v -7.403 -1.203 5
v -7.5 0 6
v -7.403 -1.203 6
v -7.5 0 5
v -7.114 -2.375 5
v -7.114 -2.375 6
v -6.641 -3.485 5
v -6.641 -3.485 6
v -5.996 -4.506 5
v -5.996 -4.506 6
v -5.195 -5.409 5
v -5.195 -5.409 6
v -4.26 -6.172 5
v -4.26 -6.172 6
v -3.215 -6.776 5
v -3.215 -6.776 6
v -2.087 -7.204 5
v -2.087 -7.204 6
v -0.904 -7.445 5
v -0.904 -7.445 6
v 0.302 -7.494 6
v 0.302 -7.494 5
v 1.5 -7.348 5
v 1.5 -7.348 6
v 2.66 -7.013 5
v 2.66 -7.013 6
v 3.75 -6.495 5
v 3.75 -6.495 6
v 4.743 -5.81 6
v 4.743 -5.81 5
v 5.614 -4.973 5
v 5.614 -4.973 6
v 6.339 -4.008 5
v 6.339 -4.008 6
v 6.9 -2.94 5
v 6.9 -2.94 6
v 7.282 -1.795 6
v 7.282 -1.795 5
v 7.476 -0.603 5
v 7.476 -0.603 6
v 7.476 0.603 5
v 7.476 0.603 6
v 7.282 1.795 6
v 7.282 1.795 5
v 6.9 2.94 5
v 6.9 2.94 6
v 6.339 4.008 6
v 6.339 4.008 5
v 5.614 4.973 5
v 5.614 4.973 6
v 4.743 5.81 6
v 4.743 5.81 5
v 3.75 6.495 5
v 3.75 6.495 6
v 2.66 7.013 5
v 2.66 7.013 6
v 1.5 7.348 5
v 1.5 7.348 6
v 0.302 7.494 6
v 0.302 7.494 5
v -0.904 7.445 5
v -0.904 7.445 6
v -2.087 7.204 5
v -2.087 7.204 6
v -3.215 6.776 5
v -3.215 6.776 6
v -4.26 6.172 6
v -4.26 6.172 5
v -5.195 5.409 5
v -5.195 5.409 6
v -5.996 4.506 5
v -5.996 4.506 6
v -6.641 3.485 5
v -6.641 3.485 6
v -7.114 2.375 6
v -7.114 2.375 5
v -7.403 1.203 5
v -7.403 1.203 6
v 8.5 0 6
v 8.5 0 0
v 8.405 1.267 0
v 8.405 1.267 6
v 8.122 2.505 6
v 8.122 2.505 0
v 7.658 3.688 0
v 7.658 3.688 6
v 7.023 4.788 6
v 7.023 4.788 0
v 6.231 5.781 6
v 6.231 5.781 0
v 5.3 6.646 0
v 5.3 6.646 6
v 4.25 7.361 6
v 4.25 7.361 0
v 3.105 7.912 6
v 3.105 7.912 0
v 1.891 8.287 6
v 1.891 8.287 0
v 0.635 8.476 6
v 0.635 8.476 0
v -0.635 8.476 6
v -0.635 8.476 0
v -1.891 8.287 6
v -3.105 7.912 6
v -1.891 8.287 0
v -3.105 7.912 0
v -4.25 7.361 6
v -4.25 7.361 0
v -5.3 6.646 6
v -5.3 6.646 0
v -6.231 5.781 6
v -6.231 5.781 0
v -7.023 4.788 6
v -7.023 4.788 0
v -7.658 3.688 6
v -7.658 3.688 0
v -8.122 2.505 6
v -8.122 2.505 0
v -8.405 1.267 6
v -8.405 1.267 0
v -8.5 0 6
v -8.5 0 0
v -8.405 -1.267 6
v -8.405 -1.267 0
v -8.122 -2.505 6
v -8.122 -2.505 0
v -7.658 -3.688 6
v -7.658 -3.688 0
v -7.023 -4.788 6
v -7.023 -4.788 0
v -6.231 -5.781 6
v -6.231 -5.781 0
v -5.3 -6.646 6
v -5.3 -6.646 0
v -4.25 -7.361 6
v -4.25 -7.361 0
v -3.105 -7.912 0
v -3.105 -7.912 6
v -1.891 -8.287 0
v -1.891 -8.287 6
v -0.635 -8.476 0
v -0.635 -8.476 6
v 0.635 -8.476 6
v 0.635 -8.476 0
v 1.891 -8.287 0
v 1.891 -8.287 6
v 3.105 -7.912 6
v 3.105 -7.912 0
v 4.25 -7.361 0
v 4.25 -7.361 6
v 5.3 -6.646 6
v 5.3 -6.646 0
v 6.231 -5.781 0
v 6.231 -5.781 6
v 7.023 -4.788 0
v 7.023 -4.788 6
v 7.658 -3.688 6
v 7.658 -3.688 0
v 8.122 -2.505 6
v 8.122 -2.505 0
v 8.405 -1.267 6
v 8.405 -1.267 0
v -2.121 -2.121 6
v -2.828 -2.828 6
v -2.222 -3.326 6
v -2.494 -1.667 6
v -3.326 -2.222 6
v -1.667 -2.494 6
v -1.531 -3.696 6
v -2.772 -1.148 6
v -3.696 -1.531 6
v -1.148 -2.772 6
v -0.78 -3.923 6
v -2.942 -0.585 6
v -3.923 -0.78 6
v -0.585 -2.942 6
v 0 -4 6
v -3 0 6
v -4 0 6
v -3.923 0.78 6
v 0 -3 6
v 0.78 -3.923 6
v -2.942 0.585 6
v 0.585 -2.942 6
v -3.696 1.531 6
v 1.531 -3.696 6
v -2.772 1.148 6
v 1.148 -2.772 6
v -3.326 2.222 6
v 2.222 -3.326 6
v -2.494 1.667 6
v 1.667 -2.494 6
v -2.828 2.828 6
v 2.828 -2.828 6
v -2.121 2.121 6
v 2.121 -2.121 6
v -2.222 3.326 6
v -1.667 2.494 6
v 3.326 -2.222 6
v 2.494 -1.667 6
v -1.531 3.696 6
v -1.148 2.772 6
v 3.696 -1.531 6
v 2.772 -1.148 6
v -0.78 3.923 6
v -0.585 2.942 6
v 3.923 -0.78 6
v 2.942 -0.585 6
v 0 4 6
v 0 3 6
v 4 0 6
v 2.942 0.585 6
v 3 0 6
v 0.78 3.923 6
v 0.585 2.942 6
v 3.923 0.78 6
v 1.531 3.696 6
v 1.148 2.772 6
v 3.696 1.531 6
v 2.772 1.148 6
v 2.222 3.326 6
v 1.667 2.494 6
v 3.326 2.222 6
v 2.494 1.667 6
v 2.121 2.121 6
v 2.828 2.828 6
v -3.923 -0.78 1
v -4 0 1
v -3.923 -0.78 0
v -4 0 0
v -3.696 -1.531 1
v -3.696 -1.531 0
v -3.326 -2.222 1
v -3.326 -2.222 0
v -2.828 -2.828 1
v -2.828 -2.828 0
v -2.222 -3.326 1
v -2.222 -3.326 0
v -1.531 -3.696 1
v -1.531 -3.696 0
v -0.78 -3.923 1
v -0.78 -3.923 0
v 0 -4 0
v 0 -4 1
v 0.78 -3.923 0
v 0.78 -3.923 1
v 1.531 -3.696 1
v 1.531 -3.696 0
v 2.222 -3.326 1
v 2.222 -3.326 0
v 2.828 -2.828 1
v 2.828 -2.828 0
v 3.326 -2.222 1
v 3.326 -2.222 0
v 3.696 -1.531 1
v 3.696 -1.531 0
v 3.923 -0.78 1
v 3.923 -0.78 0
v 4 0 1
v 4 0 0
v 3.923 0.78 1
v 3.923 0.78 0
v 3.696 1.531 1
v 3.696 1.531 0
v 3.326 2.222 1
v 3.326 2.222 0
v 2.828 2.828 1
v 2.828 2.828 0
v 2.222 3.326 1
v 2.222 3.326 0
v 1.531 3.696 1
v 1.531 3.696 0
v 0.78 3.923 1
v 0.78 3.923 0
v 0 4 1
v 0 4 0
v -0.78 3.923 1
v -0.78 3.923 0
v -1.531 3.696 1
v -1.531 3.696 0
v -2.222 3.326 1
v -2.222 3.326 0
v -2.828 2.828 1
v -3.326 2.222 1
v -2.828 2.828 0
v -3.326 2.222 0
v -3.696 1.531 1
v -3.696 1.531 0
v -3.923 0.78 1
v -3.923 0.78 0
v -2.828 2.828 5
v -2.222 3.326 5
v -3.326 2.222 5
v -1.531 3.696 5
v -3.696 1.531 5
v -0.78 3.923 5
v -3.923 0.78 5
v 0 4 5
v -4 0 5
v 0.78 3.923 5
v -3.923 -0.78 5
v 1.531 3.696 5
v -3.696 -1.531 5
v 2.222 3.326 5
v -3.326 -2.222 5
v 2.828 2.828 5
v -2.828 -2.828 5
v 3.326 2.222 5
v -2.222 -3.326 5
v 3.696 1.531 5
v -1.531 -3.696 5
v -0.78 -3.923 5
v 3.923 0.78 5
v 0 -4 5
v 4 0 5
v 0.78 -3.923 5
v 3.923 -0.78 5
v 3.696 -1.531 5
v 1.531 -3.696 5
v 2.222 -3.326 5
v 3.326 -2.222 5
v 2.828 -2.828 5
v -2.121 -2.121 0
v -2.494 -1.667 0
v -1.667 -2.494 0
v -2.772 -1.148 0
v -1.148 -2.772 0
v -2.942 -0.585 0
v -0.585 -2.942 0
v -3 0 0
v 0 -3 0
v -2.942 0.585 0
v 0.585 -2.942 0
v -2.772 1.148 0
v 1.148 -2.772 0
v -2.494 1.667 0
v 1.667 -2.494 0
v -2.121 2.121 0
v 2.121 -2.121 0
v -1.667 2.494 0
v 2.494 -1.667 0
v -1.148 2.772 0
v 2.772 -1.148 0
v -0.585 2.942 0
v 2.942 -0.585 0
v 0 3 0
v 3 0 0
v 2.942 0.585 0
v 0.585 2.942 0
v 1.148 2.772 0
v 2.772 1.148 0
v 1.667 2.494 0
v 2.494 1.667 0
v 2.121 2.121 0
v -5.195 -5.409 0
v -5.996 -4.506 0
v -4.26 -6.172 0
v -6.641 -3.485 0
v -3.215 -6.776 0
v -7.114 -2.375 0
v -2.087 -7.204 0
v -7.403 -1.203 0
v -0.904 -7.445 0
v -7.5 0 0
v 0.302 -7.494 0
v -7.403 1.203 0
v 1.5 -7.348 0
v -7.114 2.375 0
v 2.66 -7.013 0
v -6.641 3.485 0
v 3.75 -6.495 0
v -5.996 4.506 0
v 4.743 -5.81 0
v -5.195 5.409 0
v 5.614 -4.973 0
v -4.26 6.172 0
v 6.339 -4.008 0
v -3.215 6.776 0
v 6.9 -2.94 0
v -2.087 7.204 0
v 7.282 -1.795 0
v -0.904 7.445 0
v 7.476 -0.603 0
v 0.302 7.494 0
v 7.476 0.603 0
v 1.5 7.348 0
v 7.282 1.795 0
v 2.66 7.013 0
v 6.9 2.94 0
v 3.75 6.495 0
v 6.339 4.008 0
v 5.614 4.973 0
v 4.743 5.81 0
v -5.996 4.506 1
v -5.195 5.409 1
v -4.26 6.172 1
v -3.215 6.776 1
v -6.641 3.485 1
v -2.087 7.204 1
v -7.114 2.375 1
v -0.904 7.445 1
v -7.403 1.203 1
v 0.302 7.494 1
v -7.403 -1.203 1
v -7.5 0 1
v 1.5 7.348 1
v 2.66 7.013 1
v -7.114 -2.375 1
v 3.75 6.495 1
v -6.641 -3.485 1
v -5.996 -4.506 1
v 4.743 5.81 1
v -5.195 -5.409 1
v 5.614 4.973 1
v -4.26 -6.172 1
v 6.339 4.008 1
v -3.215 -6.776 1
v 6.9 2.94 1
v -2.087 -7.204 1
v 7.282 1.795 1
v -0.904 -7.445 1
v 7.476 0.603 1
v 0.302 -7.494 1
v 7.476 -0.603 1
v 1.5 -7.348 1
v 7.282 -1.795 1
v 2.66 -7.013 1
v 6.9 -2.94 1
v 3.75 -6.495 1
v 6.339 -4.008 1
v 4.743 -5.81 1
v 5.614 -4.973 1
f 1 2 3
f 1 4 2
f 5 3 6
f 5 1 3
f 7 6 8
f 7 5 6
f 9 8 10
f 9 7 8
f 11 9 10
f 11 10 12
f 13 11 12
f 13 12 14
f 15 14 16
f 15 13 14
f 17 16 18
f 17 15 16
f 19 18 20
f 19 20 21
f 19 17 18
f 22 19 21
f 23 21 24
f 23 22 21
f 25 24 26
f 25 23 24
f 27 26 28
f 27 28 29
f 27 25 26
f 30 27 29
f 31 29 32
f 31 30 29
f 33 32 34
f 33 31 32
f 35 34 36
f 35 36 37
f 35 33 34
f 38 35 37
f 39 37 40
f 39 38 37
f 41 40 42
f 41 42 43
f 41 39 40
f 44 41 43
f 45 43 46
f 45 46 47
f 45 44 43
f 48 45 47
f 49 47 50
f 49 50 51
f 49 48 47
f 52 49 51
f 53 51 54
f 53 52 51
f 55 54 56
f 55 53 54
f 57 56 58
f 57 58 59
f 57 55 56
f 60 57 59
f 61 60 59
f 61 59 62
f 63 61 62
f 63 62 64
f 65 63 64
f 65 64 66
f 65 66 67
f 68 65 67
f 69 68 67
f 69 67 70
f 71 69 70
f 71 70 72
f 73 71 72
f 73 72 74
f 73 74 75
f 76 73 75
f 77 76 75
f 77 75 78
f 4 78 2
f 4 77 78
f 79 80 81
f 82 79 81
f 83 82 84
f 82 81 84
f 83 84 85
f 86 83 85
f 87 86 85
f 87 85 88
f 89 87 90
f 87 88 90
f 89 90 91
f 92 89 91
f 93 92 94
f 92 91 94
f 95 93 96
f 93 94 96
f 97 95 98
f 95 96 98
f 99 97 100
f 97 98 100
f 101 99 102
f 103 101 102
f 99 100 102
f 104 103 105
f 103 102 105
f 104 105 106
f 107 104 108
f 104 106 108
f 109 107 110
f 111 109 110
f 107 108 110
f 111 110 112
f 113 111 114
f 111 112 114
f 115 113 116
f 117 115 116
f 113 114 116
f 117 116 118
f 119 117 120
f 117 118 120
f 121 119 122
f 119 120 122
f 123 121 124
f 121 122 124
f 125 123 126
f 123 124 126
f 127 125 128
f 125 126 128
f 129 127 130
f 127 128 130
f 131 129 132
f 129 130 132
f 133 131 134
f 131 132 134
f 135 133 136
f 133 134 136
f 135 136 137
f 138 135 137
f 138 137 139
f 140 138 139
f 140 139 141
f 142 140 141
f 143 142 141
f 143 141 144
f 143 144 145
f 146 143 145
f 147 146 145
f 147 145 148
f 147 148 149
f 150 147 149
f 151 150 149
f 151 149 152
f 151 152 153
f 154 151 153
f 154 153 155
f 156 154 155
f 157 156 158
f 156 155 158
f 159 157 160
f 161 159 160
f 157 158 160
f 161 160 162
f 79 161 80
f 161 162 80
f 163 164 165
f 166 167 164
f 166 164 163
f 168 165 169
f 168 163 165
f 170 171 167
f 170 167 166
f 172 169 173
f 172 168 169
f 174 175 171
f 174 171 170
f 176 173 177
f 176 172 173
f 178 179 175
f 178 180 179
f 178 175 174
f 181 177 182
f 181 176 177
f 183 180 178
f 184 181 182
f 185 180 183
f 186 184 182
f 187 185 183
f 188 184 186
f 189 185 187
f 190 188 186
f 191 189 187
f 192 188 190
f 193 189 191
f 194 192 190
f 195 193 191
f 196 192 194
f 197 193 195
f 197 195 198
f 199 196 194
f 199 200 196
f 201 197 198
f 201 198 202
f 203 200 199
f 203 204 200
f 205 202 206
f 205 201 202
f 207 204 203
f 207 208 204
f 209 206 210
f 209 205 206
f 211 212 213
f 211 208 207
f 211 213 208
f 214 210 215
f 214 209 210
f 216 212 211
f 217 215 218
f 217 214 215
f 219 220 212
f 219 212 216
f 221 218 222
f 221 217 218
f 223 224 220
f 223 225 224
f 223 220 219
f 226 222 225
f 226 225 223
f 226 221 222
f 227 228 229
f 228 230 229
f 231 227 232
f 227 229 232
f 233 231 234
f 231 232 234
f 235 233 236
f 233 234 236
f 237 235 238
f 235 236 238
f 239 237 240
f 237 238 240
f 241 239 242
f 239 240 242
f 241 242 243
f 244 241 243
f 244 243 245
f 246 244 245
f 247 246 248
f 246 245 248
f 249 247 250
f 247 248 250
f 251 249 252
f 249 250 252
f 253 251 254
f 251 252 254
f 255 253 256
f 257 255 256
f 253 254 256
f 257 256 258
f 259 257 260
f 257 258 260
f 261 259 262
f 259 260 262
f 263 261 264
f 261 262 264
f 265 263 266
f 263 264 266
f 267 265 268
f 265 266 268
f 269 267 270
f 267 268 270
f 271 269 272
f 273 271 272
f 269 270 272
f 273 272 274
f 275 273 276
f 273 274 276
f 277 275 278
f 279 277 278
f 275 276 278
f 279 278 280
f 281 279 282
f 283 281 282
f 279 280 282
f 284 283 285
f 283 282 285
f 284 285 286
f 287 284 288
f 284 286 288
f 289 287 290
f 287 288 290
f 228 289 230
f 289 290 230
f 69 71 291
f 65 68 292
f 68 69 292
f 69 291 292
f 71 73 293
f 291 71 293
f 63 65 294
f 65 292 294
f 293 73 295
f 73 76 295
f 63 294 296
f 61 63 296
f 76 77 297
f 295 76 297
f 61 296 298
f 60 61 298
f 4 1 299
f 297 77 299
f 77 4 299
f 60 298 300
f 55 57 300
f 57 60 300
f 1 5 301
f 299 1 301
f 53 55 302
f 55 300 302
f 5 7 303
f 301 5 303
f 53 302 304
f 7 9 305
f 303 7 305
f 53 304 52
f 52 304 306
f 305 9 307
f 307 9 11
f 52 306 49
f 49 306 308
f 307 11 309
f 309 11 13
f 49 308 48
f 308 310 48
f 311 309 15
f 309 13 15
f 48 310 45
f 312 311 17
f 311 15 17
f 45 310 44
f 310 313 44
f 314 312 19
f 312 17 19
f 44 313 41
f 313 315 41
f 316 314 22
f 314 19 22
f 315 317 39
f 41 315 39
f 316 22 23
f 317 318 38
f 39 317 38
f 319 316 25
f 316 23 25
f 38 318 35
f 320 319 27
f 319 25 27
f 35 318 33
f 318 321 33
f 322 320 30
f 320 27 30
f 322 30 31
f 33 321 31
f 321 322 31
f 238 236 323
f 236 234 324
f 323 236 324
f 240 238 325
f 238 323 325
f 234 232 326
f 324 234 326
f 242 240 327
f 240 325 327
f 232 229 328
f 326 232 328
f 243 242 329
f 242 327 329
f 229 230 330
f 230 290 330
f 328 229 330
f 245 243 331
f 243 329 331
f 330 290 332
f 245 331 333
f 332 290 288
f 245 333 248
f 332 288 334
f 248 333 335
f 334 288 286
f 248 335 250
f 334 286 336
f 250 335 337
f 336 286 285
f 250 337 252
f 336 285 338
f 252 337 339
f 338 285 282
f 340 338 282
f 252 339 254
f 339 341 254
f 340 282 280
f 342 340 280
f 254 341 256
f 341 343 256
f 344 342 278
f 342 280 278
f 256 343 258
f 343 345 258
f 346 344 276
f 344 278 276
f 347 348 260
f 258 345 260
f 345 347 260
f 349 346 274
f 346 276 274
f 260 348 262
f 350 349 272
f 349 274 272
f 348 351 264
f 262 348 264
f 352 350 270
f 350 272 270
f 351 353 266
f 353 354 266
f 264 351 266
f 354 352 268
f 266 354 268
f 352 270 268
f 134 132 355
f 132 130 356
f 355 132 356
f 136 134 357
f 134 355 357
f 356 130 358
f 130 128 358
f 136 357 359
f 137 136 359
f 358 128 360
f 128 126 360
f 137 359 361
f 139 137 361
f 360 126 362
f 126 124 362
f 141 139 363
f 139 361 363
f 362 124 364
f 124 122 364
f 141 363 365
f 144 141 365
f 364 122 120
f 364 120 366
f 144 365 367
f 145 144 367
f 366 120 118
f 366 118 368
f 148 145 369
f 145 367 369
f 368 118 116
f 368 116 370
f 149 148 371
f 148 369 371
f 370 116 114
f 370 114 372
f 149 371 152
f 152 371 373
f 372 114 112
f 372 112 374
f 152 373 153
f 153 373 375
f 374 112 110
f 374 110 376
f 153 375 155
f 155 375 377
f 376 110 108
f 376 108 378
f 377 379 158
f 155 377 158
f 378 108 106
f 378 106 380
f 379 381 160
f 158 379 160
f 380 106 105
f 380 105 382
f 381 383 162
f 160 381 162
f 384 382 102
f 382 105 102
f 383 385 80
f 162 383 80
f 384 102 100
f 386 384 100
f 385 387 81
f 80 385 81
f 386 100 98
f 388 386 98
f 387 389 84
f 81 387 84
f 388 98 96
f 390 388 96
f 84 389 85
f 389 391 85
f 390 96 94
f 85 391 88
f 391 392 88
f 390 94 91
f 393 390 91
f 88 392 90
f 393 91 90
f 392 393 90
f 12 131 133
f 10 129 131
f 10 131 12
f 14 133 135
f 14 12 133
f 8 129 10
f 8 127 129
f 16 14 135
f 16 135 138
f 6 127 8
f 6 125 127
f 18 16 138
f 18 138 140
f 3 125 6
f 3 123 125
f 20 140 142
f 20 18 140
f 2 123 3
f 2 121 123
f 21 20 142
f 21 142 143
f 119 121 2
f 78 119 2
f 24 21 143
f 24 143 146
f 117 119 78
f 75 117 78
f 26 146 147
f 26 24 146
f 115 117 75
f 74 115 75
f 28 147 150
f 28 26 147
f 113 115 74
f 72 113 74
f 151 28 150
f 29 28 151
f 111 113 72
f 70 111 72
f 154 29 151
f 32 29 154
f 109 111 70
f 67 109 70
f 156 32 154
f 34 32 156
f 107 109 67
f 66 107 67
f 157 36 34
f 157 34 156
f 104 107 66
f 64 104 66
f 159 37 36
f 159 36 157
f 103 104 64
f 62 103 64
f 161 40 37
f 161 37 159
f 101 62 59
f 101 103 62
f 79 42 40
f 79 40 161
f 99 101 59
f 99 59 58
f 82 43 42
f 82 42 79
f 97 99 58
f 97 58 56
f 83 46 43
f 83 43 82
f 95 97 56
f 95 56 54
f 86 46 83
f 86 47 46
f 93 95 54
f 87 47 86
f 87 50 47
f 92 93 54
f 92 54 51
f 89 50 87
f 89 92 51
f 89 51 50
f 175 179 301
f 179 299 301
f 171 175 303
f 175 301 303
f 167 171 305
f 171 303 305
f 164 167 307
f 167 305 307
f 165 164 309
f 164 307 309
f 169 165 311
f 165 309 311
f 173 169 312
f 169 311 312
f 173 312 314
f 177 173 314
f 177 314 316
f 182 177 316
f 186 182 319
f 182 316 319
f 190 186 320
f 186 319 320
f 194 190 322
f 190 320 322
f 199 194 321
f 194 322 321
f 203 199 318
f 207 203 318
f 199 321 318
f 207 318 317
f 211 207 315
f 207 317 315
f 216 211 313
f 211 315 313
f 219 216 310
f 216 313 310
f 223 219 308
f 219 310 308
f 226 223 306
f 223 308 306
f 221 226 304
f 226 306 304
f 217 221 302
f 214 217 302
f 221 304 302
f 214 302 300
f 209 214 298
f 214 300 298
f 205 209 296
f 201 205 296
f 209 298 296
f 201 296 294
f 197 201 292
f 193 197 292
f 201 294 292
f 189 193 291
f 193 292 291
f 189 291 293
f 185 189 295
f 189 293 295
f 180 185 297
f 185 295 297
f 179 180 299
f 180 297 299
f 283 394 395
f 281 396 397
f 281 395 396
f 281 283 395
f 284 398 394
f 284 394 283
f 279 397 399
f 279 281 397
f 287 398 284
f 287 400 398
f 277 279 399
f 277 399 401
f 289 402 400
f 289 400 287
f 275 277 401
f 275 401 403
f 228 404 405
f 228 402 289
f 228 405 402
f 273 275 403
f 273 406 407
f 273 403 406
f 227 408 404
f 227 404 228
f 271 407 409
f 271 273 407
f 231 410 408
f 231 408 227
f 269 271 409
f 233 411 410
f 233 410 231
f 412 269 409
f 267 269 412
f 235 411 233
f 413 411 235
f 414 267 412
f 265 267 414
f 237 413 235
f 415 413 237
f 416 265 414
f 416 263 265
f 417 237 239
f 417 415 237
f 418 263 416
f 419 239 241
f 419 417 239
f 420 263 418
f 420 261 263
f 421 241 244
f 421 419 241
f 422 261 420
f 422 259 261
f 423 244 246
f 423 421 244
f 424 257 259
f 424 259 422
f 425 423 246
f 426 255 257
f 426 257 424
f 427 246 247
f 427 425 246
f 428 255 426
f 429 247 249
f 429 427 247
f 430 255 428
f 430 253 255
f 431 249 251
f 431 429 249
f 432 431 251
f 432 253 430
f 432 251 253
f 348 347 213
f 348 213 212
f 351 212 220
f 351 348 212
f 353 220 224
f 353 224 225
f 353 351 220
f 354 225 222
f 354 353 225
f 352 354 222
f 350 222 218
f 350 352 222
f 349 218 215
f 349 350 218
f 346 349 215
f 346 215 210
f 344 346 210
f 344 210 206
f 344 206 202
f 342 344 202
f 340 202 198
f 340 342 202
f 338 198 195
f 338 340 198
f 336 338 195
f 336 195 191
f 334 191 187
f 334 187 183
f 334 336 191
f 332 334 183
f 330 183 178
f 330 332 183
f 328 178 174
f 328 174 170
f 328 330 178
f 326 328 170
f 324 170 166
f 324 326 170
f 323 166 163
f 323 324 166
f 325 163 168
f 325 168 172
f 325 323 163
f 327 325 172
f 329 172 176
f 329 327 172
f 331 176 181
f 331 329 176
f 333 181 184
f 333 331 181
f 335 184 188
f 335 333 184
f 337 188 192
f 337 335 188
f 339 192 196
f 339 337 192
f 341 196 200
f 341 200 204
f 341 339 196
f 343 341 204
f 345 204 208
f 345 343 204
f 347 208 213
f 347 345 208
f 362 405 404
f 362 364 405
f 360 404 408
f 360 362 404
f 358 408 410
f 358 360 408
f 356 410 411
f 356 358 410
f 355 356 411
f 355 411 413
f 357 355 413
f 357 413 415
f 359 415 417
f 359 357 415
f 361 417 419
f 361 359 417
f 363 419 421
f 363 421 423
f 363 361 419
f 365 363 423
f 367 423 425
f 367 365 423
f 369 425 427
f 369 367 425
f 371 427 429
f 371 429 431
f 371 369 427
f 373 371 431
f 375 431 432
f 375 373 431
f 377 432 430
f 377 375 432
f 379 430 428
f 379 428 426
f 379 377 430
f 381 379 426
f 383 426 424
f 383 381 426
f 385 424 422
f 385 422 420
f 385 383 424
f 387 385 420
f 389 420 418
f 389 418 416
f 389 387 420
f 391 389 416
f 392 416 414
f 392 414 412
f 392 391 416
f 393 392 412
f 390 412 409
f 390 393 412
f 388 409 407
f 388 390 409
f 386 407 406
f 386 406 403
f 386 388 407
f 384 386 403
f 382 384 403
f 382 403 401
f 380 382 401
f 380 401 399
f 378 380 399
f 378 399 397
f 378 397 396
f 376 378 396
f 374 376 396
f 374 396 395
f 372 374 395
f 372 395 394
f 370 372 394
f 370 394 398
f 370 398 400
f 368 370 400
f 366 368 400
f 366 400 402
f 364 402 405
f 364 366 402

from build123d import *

# Parameters (mm, degrees)
SKETCH1_R           = 8.5
SKETCH1_R_2         = 3
BOSS_EXTRUDE1_DEPTH = 6
SKETCH2_W           = 3.5
SKETCH2_H           = 1
SKETCH3_W           = 3.5
SKETCH3_H           = 1


with BuildPart() as part:
    # Sketch1 → Boss-Extrude1 (new body)
    with BuildSketch(Plane.XY):
        Circle(SKETCH1_R)
        Circle(SKETCH1_R_2, mode=Mode.SUBTRACT)
    extrude(amount=BOSS_EXTRUDE1_DEPTH)

    # Sketch2 → Cut-Revolve1 (revolve, cut)
    with BuildSketch(Plane(origin=(0, 0, 0), x_dir=(1, 0, 0), z_dir=(0, 1, 0)), mode=Mode.PRIVATE) as cut_revolve1_sk:
        with Locations((5.75, -0.5)):
            Rectangle(SKETCH2_W, SKETCH2_H)
    revolve(cut_revolve1_sk.sketch.rotate(Axis((0, 0, 0), (0, 0, 1)), 180), axis=Axis((0, 0, 0), (0, 0, 1)), mode=Mode.SUBTRACT)

    # Sketch3 → Cut-Revolve2 (revolve, cut)
    with BuildSketch(Plane(origin=(0, 0, 0), x_dir=(1, 0, 0), z_dir=(0, 1, 0)), mode=Mode.PRIVATE) as cut_revolve2_sk:
        with Locations((5.75, -5.5)):
            Rectangle(SKETCH3_W, SKETCH3_H)
    revolve(cut_revolve2_sk.sketch.rotate(Axis((0, 0, 0), (0, 0, 1)), 180), axis=Axis((0, 0, 0), (0, 0, 1)), mode=Mode.SUBTRACT)


solid = part.part
